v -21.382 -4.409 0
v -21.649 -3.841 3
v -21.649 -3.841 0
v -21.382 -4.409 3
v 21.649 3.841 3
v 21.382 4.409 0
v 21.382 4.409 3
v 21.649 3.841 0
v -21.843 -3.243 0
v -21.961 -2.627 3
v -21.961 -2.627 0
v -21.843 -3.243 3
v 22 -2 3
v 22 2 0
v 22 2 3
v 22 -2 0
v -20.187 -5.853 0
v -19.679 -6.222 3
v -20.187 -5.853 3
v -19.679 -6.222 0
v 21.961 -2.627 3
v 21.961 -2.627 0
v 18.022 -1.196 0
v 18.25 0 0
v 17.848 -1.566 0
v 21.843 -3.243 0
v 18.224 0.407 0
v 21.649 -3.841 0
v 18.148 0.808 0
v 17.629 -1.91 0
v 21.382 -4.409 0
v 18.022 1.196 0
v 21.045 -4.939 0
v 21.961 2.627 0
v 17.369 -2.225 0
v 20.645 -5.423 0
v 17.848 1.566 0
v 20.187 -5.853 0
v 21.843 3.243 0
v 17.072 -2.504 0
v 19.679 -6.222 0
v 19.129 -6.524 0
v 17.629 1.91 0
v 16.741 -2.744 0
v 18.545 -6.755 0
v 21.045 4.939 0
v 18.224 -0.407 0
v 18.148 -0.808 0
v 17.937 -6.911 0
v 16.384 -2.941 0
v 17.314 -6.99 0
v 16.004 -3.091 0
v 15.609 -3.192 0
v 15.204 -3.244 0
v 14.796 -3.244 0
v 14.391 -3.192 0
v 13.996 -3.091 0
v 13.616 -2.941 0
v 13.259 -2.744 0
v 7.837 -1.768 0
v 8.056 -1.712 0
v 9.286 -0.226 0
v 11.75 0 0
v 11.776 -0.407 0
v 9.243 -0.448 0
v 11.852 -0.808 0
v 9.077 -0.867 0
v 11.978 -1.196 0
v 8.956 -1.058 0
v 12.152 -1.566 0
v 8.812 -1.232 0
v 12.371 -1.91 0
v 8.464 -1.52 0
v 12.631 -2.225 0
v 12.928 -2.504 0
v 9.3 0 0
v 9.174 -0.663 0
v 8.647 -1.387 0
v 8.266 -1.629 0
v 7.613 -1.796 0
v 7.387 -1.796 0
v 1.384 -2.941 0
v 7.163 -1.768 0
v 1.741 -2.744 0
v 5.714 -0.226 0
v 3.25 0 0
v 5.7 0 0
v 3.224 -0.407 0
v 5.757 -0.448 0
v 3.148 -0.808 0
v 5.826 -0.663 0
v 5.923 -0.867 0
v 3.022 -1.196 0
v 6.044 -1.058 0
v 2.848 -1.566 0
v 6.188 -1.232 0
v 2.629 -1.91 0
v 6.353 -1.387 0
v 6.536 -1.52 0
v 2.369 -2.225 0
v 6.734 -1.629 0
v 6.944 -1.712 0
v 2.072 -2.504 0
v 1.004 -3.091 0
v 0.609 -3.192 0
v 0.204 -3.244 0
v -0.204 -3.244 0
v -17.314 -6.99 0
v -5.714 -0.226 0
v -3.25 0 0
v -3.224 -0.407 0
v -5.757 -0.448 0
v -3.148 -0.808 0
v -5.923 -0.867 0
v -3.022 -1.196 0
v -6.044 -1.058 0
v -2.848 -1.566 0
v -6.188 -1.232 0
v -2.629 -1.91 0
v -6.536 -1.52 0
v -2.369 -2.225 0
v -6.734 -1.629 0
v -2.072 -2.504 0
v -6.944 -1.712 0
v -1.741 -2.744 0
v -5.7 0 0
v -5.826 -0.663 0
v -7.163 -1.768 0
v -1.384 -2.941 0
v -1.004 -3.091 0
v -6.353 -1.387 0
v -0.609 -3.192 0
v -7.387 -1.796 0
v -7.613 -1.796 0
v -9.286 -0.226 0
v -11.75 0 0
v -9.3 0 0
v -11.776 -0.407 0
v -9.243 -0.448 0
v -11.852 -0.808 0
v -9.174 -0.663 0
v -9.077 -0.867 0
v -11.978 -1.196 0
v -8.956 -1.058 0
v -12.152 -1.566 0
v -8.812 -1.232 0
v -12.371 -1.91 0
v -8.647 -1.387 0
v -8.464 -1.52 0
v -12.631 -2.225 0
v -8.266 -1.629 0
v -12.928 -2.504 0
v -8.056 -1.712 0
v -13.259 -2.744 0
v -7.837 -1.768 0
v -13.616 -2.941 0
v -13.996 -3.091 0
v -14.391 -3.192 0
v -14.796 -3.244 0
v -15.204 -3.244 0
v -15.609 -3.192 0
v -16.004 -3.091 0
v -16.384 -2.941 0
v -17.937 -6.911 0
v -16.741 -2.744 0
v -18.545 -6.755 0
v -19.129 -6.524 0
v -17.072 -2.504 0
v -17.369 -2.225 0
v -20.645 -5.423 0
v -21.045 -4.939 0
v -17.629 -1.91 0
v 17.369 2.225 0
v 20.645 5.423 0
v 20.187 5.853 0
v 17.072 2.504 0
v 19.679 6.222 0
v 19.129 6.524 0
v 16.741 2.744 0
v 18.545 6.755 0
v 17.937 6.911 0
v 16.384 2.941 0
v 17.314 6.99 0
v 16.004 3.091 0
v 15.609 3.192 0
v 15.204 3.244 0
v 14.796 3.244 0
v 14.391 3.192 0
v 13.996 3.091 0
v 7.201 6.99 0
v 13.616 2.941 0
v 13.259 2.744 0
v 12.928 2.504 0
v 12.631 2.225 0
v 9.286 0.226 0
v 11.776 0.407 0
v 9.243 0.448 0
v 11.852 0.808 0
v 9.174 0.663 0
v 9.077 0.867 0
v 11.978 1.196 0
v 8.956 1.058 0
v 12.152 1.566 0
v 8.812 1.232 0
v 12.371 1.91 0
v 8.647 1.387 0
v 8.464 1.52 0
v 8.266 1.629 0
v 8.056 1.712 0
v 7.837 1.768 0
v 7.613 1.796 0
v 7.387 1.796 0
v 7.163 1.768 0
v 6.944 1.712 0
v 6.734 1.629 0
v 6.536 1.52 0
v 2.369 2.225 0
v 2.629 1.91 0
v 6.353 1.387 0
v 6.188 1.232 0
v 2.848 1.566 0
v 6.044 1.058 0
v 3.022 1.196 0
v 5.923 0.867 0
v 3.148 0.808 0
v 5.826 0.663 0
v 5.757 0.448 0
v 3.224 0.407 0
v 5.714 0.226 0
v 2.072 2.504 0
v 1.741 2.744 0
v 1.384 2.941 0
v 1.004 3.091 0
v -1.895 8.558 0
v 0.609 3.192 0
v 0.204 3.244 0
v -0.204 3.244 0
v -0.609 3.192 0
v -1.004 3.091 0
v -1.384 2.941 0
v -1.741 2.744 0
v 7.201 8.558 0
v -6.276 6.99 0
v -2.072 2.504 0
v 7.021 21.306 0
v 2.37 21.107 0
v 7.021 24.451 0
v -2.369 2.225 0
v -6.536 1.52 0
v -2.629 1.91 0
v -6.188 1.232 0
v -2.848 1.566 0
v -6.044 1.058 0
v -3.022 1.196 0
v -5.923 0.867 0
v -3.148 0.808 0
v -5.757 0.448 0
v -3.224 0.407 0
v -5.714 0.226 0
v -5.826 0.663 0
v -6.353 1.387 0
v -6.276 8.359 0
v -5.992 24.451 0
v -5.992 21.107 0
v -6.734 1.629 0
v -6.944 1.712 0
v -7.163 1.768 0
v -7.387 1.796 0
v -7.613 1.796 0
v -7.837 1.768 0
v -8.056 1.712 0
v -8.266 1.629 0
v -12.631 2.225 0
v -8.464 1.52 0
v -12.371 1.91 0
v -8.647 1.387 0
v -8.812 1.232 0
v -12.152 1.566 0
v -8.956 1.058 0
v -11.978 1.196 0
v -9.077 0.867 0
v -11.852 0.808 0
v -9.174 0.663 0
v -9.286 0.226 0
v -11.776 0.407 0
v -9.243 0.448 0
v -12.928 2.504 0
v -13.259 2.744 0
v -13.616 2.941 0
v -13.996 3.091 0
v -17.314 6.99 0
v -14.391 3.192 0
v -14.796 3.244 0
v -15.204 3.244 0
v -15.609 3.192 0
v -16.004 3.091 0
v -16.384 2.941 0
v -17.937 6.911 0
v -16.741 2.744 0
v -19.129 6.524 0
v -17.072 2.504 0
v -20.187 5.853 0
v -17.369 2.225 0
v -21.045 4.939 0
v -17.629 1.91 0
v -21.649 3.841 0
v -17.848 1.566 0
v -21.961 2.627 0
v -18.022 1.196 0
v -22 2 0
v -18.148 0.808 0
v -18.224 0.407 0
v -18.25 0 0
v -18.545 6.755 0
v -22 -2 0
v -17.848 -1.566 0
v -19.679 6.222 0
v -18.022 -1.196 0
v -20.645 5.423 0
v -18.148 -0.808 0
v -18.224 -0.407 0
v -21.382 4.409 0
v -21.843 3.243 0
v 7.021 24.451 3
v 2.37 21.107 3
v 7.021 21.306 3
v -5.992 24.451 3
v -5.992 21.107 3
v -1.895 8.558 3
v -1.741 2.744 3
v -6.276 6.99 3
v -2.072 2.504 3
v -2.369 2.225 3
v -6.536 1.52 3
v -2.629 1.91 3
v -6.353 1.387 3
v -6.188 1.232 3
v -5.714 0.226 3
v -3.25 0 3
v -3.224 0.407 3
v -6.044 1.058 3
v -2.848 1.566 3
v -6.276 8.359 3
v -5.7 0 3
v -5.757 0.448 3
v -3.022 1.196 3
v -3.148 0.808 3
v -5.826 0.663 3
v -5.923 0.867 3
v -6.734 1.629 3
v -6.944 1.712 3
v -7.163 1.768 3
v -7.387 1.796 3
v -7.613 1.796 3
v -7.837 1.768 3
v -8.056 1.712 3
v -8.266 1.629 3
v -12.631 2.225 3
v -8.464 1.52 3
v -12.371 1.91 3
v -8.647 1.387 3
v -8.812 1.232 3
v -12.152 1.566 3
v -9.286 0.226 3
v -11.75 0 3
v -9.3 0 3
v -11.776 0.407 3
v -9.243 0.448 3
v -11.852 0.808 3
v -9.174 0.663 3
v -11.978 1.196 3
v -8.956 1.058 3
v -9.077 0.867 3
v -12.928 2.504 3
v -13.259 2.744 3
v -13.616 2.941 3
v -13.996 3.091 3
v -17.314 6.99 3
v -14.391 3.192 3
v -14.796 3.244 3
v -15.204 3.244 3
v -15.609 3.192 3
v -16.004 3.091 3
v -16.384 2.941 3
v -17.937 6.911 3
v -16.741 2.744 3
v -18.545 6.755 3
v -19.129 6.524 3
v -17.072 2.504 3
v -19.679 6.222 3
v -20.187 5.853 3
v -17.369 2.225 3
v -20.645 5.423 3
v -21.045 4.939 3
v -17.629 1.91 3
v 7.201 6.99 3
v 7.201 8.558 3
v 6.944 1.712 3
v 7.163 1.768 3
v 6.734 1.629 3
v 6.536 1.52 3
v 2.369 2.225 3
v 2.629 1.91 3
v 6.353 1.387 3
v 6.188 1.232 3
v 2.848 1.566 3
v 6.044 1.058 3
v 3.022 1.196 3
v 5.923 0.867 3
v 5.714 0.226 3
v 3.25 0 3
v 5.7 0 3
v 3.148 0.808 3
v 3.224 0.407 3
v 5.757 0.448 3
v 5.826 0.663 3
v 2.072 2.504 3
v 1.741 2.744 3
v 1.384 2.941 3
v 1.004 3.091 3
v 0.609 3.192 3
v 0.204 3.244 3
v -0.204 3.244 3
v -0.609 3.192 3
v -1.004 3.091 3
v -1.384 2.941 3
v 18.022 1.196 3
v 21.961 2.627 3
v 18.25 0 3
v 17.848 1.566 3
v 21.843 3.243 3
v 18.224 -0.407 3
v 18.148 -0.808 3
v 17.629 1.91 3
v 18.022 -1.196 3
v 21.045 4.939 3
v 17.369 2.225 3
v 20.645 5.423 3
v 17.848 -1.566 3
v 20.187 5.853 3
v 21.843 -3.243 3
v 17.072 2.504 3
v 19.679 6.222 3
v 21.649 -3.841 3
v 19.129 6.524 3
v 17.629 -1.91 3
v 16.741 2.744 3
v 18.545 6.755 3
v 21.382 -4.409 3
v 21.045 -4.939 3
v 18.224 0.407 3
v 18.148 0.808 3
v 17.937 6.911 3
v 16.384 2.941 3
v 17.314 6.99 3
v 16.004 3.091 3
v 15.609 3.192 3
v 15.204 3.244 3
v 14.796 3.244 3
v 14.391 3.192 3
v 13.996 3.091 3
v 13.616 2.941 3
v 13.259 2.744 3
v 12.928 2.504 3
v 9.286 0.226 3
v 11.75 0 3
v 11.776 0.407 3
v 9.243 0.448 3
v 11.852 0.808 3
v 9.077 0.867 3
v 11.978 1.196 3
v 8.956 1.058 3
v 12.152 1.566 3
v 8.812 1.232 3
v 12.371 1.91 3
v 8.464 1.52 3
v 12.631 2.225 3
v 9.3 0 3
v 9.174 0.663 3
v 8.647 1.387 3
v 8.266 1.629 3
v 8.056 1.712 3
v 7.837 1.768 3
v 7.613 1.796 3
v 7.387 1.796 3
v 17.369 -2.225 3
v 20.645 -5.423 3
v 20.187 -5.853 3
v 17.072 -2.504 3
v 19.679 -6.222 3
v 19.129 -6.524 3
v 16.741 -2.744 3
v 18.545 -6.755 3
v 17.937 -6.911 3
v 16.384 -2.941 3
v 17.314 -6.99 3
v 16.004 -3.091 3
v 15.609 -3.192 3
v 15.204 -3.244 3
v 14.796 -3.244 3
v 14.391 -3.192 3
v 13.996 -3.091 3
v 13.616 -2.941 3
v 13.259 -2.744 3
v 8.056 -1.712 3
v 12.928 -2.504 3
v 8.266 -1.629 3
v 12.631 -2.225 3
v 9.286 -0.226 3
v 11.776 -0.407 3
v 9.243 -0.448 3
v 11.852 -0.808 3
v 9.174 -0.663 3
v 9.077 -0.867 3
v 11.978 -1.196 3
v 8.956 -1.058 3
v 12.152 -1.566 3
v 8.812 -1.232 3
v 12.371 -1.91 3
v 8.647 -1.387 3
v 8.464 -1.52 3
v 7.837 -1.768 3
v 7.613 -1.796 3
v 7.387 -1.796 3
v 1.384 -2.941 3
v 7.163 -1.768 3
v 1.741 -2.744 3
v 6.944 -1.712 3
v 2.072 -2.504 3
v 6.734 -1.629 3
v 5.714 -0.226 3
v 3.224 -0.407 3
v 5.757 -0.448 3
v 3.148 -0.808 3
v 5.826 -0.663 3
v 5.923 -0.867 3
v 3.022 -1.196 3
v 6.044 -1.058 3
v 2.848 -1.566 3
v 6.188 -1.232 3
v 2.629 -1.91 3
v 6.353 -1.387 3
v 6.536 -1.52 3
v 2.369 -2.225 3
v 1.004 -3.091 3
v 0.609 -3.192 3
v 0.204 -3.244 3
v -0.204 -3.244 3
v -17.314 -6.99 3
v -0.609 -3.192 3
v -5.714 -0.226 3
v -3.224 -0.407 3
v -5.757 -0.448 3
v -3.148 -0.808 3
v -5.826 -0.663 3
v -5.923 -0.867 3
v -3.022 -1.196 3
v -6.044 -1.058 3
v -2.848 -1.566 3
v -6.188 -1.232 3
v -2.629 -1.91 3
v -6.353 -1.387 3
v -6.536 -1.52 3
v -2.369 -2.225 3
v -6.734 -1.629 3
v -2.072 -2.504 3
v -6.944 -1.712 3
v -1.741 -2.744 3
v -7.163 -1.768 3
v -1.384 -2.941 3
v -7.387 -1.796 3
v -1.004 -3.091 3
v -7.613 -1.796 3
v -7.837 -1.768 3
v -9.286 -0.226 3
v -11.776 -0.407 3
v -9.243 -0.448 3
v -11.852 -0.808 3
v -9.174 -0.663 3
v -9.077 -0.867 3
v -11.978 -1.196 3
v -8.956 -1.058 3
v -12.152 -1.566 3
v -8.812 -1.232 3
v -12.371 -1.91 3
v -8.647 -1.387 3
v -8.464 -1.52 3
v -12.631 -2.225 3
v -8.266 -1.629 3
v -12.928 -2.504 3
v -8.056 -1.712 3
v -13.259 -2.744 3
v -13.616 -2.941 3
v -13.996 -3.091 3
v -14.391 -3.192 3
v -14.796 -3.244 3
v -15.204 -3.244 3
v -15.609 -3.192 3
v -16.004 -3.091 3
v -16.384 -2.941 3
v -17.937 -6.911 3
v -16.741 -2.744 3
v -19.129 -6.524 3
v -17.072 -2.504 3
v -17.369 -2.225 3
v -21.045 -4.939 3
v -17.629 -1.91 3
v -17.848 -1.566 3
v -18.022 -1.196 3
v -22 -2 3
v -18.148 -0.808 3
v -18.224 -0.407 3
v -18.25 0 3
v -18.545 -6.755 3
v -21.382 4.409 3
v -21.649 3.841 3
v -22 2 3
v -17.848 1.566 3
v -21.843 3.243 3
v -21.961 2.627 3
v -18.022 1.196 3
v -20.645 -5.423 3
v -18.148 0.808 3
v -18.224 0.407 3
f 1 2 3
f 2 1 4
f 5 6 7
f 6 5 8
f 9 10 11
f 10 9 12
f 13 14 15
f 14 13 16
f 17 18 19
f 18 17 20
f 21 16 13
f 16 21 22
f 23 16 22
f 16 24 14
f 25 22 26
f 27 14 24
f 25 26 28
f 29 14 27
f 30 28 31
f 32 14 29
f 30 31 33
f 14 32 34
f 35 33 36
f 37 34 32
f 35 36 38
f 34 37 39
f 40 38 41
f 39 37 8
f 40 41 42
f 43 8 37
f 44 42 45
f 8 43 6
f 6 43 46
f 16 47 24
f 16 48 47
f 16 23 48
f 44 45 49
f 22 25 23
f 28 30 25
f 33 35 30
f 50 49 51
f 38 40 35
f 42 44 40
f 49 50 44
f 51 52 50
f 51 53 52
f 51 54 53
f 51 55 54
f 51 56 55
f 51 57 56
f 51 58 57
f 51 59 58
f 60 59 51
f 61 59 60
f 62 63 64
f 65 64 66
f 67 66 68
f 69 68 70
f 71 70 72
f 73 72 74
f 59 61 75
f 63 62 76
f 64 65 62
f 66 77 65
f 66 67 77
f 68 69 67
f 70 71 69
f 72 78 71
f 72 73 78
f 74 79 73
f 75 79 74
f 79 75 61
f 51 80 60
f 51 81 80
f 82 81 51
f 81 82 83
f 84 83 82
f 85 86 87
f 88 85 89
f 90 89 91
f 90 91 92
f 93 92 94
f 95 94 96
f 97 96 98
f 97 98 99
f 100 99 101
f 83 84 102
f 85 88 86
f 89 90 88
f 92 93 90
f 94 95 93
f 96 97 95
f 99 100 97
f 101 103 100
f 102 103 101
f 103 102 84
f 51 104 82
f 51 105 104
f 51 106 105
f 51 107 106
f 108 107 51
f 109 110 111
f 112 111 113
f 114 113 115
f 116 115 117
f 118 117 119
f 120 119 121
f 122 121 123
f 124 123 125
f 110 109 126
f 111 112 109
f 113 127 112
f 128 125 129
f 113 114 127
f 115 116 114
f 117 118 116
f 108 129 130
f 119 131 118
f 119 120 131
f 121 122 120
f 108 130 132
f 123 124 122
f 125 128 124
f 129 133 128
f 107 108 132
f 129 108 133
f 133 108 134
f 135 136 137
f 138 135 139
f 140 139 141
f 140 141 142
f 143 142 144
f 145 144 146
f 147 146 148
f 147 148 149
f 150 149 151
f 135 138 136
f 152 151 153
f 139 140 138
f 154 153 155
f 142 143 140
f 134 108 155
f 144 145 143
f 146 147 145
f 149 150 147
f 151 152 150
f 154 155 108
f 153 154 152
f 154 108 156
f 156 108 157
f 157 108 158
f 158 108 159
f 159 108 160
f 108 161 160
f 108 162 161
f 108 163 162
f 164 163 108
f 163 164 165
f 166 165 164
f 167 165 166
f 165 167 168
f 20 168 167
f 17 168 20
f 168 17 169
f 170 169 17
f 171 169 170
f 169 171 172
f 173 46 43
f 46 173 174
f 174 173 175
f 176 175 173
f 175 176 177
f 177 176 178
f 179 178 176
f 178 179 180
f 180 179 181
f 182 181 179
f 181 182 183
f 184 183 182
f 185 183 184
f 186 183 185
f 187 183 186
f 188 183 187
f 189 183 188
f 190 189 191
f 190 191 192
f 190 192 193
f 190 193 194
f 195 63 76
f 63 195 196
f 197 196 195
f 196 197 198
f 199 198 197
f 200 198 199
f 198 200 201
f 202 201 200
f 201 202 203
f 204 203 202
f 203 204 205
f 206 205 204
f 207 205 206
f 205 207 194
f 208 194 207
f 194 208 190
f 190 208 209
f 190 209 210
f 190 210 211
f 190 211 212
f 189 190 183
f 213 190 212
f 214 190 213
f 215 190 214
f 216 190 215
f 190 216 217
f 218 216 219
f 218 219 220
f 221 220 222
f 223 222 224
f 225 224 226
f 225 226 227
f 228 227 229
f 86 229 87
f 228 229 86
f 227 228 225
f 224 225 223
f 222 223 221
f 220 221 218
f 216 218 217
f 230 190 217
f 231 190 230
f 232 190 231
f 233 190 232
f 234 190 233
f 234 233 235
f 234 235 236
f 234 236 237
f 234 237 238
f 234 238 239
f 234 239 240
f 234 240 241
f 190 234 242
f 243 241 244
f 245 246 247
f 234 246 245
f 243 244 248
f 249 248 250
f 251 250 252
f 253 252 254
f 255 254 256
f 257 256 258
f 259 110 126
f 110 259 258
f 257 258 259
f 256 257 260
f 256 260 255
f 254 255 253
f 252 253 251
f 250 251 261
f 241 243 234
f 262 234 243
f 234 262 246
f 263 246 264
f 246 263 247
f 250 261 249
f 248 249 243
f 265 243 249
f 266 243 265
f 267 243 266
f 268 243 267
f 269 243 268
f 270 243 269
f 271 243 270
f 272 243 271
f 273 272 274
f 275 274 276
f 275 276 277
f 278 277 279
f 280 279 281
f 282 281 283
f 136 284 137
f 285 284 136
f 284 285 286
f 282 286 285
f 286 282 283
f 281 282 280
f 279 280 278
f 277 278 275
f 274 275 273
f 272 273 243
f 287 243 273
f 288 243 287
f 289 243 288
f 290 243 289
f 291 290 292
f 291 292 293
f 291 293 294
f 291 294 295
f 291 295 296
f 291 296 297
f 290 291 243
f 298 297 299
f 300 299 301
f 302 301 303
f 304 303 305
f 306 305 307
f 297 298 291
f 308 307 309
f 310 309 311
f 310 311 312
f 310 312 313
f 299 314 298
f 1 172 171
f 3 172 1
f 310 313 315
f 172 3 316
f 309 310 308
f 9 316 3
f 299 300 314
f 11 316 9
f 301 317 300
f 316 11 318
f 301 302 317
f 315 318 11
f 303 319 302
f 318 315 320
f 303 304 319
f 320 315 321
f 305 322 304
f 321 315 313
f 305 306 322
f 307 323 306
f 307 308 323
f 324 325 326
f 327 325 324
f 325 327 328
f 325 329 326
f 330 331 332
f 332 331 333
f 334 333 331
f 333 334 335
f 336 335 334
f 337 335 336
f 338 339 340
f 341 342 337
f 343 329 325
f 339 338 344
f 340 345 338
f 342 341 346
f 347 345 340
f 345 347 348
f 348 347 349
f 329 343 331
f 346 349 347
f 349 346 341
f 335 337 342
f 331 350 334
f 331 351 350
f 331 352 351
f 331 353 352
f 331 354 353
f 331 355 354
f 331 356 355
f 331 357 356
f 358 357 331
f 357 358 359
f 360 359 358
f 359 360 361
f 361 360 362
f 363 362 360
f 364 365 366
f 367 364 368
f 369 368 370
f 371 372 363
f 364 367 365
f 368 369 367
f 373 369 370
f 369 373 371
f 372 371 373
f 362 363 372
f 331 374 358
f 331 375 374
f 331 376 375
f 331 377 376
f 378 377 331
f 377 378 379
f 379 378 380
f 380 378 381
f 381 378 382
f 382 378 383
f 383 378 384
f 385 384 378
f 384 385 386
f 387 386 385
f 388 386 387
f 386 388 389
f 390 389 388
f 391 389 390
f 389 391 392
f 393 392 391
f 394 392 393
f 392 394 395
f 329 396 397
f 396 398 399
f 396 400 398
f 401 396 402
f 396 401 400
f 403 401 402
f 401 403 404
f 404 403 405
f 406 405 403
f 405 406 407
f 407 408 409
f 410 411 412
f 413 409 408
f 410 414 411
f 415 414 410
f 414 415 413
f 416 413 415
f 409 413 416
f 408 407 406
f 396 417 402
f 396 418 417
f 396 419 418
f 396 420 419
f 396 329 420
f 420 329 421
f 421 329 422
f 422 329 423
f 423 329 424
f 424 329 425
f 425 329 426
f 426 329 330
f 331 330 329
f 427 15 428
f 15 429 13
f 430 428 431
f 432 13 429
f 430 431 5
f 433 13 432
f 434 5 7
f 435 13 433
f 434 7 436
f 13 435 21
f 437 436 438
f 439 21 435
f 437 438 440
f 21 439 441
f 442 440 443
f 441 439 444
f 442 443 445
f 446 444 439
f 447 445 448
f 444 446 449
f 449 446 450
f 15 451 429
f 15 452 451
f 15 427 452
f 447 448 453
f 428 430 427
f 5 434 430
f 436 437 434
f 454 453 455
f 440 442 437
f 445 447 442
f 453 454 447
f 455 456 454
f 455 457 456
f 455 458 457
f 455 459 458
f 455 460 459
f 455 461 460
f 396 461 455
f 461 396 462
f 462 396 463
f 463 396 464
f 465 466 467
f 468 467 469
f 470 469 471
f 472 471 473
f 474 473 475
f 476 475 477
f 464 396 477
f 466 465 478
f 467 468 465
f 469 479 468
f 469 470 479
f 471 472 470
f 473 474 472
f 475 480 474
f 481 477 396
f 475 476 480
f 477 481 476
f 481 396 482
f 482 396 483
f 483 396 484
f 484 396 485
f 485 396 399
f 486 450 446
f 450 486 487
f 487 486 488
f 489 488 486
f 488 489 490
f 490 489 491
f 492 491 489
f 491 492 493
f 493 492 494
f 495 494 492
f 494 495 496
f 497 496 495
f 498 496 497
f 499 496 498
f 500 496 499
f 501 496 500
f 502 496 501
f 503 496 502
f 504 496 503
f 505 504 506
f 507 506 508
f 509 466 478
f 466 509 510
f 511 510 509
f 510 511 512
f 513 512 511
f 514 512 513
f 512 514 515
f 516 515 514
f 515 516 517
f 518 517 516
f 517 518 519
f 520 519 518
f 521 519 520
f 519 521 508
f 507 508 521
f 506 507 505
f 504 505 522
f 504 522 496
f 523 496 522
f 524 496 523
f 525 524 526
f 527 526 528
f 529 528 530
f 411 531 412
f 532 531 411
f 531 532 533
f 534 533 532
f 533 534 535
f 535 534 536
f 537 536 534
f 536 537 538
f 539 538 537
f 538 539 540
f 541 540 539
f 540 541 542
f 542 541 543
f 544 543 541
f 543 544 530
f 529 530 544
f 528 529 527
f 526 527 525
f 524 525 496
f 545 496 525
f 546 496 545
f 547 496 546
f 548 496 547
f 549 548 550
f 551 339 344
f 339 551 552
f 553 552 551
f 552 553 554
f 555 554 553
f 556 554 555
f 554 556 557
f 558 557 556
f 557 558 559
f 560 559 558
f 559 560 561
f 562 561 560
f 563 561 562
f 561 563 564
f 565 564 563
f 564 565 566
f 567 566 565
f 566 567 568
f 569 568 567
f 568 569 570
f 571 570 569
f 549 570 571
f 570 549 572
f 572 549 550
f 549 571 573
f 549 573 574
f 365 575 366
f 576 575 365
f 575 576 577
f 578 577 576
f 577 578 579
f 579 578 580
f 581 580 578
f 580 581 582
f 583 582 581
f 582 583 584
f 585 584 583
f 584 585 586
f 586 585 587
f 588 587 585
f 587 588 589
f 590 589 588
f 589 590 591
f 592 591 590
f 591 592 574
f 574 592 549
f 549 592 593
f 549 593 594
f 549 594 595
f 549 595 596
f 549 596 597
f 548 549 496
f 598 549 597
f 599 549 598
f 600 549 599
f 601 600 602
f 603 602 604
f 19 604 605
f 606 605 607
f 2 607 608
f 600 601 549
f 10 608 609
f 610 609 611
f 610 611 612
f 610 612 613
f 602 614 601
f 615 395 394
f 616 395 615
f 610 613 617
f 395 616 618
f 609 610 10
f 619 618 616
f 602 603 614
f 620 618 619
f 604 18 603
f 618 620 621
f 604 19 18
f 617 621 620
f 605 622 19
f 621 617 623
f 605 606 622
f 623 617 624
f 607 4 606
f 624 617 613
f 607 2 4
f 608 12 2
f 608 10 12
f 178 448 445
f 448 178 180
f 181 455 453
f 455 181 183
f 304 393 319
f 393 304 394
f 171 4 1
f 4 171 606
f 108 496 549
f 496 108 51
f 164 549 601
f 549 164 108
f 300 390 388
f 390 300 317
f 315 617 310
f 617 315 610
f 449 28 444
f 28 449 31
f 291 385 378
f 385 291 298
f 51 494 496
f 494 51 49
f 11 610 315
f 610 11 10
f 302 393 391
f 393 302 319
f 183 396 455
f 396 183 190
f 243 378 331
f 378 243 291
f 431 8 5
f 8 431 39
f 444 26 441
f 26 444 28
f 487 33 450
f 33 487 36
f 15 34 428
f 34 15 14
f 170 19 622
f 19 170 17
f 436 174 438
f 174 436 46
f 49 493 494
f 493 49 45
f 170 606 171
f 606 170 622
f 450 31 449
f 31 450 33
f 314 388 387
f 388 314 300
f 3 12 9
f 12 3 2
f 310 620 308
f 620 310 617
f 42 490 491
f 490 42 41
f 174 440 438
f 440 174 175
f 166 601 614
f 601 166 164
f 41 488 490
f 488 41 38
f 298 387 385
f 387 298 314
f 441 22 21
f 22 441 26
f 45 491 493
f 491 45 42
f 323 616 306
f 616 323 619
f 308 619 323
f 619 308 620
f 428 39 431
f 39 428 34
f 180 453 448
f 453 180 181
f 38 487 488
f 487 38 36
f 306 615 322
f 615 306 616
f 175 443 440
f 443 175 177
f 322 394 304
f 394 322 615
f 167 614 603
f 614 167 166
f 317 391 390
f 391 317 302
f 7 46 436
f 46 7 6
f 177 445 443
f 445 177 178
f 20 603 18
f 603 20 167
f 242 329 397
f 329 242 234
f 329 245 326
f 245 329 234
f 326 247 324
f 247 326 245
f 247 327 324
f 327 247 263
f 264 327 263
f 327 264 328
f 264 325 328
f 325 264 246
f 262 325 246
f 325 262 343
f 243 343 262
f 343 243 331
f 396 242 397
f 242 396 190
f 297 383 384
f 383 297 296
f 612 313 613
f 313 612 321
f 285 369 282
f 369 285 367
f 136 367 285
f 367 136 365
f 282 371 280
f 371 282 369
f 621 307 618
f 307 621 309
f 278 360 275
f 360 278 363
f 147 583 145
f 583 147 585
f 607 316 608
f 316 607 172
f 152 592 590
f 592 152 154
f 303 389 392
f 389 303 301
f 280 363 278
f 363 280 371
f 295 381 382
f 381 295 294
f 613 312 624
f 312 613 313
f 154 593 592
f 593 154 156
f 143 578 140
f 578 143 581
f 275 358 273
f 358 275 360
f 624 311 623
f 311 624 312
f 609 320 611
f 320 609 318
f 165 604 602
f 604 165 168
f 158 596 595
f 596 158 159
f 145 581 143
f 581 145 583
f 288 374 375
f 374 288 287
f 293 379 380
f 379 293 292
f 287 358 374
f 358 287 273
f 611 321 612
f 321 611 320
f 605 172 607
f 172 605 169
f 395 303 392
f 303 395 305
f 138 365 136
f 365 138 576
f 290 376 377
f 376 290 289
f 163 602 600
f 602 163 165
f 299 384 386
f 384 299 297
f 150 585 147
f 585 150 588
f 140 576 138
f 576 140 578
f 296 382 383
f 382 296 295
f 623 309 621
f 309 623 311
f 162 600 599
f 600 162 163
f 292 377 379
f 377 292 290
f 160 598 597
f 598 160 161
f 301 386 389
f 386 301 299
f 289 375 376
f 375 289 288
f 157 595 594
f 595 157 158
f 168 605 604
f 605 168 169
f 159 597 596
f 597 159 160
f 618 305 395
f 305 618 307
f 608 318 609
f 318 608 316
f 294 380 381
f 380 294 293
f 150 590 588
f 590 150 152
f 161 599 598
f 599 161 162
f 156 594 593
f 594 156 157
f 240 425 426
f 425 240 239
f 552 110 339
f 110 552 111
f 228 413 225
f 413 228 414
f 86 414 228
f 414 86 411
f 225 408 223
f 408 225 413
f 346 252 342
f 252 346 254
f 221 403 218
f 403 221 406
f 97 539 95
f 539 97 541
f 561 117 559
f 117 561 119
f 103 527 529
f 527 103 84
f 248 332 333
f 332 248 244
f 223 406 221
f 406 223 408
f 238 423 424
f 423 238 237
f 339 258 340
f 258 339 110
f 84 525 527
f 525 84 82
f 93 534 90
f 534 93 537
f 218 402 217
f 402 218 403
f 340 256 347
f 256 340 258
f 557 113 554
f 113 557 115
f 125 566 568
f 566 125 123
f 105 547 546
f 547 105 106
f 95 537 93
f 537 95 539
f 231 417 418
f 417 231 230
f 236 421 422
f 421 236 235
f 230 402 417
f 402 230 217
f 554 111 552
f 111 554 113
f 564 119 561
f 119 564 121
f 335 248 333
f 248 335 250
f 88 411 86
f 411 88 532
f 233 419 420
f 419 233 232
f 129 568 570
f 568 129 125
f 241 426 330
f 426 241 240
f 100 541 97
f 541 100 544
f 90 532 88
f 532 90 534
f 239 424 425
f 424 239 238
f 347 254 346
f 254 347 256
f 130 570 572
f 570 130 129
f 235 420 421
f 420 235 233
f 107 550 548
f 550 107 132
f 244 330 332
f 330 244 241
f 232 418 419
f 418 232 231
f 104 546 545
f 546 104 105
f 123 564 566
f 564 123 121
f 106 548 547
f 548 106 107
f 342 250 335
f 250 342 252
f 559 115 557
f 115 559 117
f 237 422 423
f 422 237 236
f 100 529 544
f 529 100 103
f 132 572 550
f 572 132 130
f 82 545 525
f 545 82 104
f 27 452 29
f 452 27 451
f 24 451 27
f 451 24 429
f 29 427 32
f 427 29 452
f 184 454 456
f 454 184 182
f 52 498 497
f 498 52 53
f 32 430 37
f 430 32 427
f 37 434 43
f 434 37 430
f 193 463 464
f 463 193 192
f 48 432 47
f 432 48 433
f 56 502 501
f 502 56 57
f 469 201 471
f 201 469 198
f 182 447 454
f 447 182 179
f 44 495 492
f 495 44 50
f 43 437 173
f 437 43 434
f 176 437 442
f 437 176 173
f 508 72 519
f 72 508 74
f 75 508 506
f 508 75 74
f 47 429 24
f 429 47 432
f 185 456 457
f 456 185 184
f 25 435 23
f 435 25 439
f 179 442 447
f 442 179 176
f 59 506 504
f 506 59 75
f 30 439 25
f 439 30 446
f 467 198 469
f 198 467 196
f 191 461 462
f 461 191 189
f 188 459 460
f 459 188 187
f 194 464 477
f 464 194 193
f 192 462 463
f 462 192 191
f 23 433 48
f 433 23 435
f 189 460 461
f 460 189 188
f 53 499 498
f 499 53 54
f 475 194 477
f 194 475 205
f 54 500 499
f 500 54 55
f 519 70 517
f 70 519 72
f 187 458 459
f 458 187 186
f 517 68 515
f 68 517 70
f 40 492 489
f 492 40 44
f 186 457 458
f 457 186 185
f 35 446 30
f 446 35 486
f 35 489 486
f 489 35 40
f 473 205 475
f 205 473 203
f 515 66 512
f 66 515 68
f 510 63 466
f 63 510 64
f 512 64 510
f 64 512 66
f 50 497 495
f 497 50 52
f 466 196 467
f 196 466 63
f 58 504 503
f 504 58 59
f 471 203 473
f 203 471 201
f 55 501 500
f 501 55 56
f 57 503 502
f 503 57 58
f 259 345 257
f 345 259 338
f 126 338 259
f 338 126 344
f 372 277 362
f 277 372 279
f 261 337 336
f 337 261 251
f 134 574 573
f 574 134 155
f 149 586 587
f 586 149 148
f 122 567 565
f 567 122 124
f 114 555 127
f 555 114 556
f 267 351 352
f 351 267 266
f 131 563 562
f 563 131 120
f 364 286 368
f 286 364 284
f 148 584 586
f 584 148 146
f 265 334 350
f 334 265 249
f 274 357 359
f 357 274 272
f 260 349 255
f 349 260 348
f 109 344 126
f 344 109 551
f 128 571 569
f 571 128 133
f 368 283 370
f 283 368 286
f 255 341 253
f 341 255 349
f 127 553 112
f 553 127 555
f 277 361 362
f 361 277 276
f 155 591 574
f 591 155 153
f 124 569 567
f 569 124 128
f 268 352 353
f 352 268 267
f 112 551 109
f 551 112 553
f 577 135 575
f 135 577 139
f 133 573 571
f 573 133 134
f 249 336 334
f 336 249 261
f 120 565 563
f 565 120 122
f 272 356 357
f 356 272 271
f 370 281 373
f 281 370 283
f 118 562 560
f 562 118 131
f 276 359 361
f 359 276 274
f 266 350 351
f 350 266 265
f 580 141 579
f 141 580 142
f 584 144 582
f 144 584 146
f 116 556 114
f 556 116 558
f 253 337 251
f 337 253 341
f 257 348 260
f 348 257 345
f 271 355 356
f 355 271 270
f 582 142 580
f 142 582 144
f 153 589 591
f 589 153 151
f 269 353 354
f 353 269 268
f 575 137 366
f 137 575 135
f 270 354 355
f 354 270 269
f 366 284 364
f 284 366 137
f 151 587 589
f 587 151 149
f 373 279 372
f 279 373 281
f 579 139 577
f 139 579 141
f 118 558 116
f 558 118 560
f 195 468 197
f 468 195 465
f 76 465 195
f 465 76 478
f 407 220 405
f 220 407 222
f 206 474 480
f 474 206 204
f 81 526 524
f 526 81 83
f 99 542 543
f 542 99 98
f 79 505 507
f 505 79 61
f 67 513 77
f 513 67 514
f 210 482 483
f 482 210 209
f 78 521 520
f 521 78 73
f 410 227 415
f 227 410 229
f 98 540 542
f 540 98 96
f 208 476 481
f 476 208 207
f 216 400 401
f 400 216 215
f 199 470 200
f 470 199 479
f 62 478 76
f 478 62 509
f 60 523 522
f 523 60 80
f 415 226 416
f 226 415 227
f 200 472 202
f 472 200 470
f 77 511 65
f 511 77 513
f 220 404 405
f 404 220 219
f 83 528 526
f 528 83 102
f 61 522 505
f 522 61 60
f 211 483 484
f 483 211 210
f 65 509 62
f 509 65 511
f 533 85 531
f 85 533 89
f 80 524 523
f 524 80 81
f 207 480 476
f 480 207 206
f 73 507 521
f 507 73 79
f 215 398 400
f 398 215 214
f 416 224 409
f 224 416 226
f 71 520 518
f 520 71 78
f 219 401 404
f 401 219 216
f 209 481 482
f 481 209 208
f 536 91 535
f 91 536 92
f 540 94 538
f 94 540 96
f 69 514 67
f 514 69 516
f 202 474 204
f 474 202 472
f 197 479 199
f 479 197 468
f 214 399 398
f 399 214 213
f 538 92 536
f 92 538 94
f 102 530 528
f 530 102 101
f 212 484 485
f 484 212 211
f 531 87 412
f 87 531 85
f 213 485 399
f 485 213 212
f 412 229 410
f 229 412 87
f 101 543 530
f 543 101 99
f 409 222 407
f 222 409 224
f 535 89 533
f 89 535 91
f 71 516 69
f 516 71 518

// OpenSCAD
$fn = 50;


difference() {
	union() {
		hull() {
			translate(v = [-17.0000000000, 2.0000000000, 0]) {
				cylinder(h = 3, r = 5);
			}
			translate(v = [17.0000000000, 2.0000000000, 0]) {
				cylinder(h = 3, r = 5);
			}
			translate(v = [-17.0000000000, -2.0000000000, 0]) {
				cylinder(h = 3, r = 5);
			}
			translate(v = [17.0000000000, -2.0000000000, 0]) {
				cylinder(h = 3, r = 5);
			}
		}
		translate(v = [0, 24, 0]) {
			linear_extrude(height = 3) {
				text(font = "DejaVu Sans Mono:style=Bold", halign = "center", size = 19.0000000000, text = "Z", valign = "top");
			}
		}
	}
	union() {
		translate(v = [-15.0000000000, 0.0000000000, 0]) {
			translate(v = [0, 0, -100]) {
				cylinder(h = 200, r = 3.2500000000);
			}
		}
		translate(v = [0, 0, -100]) {
			cylinder(h = 200, r = 3.2500000000);
		}
		translate(v = [15.0000000000, 0.0000000000, 0]) {
			translate(v = [0, 0, -100]) {
				cylinder(h = 200, r = 3.2500000000);
			}
		}
		translate(v = [-15.0000000000, 0.0000000000, 0]) {
			translate(v = [0, 0, -100]) {
				cylinder(h = 200, r = 1.8000000000);
			}
		}
		translate(v = [-7.5000000000, 0.0000000000, 0]) {
			translate(v = [0, 0, -100]) {
				cylinder(h = 200, r = 1.8000000000);
			}
		}
		translate(v = [0, 0, -100]) {
			cylinder(h = 200, r = 1.8000000000);
		}
		translate(v = [7.5000000000, 0.0000000000, 0]) {
			translate(v = [0, 0, -100]) {
				cylinder(h = 200, r = 1.8000000000);
			}
		}
		translate(v = [15.0000000000, 0.0000000000, 0]) {
			translate(v = [0, 0, -100]) {
				cylinder(h = 200, r = 1.8000000000);
			}
		}
	}
}
